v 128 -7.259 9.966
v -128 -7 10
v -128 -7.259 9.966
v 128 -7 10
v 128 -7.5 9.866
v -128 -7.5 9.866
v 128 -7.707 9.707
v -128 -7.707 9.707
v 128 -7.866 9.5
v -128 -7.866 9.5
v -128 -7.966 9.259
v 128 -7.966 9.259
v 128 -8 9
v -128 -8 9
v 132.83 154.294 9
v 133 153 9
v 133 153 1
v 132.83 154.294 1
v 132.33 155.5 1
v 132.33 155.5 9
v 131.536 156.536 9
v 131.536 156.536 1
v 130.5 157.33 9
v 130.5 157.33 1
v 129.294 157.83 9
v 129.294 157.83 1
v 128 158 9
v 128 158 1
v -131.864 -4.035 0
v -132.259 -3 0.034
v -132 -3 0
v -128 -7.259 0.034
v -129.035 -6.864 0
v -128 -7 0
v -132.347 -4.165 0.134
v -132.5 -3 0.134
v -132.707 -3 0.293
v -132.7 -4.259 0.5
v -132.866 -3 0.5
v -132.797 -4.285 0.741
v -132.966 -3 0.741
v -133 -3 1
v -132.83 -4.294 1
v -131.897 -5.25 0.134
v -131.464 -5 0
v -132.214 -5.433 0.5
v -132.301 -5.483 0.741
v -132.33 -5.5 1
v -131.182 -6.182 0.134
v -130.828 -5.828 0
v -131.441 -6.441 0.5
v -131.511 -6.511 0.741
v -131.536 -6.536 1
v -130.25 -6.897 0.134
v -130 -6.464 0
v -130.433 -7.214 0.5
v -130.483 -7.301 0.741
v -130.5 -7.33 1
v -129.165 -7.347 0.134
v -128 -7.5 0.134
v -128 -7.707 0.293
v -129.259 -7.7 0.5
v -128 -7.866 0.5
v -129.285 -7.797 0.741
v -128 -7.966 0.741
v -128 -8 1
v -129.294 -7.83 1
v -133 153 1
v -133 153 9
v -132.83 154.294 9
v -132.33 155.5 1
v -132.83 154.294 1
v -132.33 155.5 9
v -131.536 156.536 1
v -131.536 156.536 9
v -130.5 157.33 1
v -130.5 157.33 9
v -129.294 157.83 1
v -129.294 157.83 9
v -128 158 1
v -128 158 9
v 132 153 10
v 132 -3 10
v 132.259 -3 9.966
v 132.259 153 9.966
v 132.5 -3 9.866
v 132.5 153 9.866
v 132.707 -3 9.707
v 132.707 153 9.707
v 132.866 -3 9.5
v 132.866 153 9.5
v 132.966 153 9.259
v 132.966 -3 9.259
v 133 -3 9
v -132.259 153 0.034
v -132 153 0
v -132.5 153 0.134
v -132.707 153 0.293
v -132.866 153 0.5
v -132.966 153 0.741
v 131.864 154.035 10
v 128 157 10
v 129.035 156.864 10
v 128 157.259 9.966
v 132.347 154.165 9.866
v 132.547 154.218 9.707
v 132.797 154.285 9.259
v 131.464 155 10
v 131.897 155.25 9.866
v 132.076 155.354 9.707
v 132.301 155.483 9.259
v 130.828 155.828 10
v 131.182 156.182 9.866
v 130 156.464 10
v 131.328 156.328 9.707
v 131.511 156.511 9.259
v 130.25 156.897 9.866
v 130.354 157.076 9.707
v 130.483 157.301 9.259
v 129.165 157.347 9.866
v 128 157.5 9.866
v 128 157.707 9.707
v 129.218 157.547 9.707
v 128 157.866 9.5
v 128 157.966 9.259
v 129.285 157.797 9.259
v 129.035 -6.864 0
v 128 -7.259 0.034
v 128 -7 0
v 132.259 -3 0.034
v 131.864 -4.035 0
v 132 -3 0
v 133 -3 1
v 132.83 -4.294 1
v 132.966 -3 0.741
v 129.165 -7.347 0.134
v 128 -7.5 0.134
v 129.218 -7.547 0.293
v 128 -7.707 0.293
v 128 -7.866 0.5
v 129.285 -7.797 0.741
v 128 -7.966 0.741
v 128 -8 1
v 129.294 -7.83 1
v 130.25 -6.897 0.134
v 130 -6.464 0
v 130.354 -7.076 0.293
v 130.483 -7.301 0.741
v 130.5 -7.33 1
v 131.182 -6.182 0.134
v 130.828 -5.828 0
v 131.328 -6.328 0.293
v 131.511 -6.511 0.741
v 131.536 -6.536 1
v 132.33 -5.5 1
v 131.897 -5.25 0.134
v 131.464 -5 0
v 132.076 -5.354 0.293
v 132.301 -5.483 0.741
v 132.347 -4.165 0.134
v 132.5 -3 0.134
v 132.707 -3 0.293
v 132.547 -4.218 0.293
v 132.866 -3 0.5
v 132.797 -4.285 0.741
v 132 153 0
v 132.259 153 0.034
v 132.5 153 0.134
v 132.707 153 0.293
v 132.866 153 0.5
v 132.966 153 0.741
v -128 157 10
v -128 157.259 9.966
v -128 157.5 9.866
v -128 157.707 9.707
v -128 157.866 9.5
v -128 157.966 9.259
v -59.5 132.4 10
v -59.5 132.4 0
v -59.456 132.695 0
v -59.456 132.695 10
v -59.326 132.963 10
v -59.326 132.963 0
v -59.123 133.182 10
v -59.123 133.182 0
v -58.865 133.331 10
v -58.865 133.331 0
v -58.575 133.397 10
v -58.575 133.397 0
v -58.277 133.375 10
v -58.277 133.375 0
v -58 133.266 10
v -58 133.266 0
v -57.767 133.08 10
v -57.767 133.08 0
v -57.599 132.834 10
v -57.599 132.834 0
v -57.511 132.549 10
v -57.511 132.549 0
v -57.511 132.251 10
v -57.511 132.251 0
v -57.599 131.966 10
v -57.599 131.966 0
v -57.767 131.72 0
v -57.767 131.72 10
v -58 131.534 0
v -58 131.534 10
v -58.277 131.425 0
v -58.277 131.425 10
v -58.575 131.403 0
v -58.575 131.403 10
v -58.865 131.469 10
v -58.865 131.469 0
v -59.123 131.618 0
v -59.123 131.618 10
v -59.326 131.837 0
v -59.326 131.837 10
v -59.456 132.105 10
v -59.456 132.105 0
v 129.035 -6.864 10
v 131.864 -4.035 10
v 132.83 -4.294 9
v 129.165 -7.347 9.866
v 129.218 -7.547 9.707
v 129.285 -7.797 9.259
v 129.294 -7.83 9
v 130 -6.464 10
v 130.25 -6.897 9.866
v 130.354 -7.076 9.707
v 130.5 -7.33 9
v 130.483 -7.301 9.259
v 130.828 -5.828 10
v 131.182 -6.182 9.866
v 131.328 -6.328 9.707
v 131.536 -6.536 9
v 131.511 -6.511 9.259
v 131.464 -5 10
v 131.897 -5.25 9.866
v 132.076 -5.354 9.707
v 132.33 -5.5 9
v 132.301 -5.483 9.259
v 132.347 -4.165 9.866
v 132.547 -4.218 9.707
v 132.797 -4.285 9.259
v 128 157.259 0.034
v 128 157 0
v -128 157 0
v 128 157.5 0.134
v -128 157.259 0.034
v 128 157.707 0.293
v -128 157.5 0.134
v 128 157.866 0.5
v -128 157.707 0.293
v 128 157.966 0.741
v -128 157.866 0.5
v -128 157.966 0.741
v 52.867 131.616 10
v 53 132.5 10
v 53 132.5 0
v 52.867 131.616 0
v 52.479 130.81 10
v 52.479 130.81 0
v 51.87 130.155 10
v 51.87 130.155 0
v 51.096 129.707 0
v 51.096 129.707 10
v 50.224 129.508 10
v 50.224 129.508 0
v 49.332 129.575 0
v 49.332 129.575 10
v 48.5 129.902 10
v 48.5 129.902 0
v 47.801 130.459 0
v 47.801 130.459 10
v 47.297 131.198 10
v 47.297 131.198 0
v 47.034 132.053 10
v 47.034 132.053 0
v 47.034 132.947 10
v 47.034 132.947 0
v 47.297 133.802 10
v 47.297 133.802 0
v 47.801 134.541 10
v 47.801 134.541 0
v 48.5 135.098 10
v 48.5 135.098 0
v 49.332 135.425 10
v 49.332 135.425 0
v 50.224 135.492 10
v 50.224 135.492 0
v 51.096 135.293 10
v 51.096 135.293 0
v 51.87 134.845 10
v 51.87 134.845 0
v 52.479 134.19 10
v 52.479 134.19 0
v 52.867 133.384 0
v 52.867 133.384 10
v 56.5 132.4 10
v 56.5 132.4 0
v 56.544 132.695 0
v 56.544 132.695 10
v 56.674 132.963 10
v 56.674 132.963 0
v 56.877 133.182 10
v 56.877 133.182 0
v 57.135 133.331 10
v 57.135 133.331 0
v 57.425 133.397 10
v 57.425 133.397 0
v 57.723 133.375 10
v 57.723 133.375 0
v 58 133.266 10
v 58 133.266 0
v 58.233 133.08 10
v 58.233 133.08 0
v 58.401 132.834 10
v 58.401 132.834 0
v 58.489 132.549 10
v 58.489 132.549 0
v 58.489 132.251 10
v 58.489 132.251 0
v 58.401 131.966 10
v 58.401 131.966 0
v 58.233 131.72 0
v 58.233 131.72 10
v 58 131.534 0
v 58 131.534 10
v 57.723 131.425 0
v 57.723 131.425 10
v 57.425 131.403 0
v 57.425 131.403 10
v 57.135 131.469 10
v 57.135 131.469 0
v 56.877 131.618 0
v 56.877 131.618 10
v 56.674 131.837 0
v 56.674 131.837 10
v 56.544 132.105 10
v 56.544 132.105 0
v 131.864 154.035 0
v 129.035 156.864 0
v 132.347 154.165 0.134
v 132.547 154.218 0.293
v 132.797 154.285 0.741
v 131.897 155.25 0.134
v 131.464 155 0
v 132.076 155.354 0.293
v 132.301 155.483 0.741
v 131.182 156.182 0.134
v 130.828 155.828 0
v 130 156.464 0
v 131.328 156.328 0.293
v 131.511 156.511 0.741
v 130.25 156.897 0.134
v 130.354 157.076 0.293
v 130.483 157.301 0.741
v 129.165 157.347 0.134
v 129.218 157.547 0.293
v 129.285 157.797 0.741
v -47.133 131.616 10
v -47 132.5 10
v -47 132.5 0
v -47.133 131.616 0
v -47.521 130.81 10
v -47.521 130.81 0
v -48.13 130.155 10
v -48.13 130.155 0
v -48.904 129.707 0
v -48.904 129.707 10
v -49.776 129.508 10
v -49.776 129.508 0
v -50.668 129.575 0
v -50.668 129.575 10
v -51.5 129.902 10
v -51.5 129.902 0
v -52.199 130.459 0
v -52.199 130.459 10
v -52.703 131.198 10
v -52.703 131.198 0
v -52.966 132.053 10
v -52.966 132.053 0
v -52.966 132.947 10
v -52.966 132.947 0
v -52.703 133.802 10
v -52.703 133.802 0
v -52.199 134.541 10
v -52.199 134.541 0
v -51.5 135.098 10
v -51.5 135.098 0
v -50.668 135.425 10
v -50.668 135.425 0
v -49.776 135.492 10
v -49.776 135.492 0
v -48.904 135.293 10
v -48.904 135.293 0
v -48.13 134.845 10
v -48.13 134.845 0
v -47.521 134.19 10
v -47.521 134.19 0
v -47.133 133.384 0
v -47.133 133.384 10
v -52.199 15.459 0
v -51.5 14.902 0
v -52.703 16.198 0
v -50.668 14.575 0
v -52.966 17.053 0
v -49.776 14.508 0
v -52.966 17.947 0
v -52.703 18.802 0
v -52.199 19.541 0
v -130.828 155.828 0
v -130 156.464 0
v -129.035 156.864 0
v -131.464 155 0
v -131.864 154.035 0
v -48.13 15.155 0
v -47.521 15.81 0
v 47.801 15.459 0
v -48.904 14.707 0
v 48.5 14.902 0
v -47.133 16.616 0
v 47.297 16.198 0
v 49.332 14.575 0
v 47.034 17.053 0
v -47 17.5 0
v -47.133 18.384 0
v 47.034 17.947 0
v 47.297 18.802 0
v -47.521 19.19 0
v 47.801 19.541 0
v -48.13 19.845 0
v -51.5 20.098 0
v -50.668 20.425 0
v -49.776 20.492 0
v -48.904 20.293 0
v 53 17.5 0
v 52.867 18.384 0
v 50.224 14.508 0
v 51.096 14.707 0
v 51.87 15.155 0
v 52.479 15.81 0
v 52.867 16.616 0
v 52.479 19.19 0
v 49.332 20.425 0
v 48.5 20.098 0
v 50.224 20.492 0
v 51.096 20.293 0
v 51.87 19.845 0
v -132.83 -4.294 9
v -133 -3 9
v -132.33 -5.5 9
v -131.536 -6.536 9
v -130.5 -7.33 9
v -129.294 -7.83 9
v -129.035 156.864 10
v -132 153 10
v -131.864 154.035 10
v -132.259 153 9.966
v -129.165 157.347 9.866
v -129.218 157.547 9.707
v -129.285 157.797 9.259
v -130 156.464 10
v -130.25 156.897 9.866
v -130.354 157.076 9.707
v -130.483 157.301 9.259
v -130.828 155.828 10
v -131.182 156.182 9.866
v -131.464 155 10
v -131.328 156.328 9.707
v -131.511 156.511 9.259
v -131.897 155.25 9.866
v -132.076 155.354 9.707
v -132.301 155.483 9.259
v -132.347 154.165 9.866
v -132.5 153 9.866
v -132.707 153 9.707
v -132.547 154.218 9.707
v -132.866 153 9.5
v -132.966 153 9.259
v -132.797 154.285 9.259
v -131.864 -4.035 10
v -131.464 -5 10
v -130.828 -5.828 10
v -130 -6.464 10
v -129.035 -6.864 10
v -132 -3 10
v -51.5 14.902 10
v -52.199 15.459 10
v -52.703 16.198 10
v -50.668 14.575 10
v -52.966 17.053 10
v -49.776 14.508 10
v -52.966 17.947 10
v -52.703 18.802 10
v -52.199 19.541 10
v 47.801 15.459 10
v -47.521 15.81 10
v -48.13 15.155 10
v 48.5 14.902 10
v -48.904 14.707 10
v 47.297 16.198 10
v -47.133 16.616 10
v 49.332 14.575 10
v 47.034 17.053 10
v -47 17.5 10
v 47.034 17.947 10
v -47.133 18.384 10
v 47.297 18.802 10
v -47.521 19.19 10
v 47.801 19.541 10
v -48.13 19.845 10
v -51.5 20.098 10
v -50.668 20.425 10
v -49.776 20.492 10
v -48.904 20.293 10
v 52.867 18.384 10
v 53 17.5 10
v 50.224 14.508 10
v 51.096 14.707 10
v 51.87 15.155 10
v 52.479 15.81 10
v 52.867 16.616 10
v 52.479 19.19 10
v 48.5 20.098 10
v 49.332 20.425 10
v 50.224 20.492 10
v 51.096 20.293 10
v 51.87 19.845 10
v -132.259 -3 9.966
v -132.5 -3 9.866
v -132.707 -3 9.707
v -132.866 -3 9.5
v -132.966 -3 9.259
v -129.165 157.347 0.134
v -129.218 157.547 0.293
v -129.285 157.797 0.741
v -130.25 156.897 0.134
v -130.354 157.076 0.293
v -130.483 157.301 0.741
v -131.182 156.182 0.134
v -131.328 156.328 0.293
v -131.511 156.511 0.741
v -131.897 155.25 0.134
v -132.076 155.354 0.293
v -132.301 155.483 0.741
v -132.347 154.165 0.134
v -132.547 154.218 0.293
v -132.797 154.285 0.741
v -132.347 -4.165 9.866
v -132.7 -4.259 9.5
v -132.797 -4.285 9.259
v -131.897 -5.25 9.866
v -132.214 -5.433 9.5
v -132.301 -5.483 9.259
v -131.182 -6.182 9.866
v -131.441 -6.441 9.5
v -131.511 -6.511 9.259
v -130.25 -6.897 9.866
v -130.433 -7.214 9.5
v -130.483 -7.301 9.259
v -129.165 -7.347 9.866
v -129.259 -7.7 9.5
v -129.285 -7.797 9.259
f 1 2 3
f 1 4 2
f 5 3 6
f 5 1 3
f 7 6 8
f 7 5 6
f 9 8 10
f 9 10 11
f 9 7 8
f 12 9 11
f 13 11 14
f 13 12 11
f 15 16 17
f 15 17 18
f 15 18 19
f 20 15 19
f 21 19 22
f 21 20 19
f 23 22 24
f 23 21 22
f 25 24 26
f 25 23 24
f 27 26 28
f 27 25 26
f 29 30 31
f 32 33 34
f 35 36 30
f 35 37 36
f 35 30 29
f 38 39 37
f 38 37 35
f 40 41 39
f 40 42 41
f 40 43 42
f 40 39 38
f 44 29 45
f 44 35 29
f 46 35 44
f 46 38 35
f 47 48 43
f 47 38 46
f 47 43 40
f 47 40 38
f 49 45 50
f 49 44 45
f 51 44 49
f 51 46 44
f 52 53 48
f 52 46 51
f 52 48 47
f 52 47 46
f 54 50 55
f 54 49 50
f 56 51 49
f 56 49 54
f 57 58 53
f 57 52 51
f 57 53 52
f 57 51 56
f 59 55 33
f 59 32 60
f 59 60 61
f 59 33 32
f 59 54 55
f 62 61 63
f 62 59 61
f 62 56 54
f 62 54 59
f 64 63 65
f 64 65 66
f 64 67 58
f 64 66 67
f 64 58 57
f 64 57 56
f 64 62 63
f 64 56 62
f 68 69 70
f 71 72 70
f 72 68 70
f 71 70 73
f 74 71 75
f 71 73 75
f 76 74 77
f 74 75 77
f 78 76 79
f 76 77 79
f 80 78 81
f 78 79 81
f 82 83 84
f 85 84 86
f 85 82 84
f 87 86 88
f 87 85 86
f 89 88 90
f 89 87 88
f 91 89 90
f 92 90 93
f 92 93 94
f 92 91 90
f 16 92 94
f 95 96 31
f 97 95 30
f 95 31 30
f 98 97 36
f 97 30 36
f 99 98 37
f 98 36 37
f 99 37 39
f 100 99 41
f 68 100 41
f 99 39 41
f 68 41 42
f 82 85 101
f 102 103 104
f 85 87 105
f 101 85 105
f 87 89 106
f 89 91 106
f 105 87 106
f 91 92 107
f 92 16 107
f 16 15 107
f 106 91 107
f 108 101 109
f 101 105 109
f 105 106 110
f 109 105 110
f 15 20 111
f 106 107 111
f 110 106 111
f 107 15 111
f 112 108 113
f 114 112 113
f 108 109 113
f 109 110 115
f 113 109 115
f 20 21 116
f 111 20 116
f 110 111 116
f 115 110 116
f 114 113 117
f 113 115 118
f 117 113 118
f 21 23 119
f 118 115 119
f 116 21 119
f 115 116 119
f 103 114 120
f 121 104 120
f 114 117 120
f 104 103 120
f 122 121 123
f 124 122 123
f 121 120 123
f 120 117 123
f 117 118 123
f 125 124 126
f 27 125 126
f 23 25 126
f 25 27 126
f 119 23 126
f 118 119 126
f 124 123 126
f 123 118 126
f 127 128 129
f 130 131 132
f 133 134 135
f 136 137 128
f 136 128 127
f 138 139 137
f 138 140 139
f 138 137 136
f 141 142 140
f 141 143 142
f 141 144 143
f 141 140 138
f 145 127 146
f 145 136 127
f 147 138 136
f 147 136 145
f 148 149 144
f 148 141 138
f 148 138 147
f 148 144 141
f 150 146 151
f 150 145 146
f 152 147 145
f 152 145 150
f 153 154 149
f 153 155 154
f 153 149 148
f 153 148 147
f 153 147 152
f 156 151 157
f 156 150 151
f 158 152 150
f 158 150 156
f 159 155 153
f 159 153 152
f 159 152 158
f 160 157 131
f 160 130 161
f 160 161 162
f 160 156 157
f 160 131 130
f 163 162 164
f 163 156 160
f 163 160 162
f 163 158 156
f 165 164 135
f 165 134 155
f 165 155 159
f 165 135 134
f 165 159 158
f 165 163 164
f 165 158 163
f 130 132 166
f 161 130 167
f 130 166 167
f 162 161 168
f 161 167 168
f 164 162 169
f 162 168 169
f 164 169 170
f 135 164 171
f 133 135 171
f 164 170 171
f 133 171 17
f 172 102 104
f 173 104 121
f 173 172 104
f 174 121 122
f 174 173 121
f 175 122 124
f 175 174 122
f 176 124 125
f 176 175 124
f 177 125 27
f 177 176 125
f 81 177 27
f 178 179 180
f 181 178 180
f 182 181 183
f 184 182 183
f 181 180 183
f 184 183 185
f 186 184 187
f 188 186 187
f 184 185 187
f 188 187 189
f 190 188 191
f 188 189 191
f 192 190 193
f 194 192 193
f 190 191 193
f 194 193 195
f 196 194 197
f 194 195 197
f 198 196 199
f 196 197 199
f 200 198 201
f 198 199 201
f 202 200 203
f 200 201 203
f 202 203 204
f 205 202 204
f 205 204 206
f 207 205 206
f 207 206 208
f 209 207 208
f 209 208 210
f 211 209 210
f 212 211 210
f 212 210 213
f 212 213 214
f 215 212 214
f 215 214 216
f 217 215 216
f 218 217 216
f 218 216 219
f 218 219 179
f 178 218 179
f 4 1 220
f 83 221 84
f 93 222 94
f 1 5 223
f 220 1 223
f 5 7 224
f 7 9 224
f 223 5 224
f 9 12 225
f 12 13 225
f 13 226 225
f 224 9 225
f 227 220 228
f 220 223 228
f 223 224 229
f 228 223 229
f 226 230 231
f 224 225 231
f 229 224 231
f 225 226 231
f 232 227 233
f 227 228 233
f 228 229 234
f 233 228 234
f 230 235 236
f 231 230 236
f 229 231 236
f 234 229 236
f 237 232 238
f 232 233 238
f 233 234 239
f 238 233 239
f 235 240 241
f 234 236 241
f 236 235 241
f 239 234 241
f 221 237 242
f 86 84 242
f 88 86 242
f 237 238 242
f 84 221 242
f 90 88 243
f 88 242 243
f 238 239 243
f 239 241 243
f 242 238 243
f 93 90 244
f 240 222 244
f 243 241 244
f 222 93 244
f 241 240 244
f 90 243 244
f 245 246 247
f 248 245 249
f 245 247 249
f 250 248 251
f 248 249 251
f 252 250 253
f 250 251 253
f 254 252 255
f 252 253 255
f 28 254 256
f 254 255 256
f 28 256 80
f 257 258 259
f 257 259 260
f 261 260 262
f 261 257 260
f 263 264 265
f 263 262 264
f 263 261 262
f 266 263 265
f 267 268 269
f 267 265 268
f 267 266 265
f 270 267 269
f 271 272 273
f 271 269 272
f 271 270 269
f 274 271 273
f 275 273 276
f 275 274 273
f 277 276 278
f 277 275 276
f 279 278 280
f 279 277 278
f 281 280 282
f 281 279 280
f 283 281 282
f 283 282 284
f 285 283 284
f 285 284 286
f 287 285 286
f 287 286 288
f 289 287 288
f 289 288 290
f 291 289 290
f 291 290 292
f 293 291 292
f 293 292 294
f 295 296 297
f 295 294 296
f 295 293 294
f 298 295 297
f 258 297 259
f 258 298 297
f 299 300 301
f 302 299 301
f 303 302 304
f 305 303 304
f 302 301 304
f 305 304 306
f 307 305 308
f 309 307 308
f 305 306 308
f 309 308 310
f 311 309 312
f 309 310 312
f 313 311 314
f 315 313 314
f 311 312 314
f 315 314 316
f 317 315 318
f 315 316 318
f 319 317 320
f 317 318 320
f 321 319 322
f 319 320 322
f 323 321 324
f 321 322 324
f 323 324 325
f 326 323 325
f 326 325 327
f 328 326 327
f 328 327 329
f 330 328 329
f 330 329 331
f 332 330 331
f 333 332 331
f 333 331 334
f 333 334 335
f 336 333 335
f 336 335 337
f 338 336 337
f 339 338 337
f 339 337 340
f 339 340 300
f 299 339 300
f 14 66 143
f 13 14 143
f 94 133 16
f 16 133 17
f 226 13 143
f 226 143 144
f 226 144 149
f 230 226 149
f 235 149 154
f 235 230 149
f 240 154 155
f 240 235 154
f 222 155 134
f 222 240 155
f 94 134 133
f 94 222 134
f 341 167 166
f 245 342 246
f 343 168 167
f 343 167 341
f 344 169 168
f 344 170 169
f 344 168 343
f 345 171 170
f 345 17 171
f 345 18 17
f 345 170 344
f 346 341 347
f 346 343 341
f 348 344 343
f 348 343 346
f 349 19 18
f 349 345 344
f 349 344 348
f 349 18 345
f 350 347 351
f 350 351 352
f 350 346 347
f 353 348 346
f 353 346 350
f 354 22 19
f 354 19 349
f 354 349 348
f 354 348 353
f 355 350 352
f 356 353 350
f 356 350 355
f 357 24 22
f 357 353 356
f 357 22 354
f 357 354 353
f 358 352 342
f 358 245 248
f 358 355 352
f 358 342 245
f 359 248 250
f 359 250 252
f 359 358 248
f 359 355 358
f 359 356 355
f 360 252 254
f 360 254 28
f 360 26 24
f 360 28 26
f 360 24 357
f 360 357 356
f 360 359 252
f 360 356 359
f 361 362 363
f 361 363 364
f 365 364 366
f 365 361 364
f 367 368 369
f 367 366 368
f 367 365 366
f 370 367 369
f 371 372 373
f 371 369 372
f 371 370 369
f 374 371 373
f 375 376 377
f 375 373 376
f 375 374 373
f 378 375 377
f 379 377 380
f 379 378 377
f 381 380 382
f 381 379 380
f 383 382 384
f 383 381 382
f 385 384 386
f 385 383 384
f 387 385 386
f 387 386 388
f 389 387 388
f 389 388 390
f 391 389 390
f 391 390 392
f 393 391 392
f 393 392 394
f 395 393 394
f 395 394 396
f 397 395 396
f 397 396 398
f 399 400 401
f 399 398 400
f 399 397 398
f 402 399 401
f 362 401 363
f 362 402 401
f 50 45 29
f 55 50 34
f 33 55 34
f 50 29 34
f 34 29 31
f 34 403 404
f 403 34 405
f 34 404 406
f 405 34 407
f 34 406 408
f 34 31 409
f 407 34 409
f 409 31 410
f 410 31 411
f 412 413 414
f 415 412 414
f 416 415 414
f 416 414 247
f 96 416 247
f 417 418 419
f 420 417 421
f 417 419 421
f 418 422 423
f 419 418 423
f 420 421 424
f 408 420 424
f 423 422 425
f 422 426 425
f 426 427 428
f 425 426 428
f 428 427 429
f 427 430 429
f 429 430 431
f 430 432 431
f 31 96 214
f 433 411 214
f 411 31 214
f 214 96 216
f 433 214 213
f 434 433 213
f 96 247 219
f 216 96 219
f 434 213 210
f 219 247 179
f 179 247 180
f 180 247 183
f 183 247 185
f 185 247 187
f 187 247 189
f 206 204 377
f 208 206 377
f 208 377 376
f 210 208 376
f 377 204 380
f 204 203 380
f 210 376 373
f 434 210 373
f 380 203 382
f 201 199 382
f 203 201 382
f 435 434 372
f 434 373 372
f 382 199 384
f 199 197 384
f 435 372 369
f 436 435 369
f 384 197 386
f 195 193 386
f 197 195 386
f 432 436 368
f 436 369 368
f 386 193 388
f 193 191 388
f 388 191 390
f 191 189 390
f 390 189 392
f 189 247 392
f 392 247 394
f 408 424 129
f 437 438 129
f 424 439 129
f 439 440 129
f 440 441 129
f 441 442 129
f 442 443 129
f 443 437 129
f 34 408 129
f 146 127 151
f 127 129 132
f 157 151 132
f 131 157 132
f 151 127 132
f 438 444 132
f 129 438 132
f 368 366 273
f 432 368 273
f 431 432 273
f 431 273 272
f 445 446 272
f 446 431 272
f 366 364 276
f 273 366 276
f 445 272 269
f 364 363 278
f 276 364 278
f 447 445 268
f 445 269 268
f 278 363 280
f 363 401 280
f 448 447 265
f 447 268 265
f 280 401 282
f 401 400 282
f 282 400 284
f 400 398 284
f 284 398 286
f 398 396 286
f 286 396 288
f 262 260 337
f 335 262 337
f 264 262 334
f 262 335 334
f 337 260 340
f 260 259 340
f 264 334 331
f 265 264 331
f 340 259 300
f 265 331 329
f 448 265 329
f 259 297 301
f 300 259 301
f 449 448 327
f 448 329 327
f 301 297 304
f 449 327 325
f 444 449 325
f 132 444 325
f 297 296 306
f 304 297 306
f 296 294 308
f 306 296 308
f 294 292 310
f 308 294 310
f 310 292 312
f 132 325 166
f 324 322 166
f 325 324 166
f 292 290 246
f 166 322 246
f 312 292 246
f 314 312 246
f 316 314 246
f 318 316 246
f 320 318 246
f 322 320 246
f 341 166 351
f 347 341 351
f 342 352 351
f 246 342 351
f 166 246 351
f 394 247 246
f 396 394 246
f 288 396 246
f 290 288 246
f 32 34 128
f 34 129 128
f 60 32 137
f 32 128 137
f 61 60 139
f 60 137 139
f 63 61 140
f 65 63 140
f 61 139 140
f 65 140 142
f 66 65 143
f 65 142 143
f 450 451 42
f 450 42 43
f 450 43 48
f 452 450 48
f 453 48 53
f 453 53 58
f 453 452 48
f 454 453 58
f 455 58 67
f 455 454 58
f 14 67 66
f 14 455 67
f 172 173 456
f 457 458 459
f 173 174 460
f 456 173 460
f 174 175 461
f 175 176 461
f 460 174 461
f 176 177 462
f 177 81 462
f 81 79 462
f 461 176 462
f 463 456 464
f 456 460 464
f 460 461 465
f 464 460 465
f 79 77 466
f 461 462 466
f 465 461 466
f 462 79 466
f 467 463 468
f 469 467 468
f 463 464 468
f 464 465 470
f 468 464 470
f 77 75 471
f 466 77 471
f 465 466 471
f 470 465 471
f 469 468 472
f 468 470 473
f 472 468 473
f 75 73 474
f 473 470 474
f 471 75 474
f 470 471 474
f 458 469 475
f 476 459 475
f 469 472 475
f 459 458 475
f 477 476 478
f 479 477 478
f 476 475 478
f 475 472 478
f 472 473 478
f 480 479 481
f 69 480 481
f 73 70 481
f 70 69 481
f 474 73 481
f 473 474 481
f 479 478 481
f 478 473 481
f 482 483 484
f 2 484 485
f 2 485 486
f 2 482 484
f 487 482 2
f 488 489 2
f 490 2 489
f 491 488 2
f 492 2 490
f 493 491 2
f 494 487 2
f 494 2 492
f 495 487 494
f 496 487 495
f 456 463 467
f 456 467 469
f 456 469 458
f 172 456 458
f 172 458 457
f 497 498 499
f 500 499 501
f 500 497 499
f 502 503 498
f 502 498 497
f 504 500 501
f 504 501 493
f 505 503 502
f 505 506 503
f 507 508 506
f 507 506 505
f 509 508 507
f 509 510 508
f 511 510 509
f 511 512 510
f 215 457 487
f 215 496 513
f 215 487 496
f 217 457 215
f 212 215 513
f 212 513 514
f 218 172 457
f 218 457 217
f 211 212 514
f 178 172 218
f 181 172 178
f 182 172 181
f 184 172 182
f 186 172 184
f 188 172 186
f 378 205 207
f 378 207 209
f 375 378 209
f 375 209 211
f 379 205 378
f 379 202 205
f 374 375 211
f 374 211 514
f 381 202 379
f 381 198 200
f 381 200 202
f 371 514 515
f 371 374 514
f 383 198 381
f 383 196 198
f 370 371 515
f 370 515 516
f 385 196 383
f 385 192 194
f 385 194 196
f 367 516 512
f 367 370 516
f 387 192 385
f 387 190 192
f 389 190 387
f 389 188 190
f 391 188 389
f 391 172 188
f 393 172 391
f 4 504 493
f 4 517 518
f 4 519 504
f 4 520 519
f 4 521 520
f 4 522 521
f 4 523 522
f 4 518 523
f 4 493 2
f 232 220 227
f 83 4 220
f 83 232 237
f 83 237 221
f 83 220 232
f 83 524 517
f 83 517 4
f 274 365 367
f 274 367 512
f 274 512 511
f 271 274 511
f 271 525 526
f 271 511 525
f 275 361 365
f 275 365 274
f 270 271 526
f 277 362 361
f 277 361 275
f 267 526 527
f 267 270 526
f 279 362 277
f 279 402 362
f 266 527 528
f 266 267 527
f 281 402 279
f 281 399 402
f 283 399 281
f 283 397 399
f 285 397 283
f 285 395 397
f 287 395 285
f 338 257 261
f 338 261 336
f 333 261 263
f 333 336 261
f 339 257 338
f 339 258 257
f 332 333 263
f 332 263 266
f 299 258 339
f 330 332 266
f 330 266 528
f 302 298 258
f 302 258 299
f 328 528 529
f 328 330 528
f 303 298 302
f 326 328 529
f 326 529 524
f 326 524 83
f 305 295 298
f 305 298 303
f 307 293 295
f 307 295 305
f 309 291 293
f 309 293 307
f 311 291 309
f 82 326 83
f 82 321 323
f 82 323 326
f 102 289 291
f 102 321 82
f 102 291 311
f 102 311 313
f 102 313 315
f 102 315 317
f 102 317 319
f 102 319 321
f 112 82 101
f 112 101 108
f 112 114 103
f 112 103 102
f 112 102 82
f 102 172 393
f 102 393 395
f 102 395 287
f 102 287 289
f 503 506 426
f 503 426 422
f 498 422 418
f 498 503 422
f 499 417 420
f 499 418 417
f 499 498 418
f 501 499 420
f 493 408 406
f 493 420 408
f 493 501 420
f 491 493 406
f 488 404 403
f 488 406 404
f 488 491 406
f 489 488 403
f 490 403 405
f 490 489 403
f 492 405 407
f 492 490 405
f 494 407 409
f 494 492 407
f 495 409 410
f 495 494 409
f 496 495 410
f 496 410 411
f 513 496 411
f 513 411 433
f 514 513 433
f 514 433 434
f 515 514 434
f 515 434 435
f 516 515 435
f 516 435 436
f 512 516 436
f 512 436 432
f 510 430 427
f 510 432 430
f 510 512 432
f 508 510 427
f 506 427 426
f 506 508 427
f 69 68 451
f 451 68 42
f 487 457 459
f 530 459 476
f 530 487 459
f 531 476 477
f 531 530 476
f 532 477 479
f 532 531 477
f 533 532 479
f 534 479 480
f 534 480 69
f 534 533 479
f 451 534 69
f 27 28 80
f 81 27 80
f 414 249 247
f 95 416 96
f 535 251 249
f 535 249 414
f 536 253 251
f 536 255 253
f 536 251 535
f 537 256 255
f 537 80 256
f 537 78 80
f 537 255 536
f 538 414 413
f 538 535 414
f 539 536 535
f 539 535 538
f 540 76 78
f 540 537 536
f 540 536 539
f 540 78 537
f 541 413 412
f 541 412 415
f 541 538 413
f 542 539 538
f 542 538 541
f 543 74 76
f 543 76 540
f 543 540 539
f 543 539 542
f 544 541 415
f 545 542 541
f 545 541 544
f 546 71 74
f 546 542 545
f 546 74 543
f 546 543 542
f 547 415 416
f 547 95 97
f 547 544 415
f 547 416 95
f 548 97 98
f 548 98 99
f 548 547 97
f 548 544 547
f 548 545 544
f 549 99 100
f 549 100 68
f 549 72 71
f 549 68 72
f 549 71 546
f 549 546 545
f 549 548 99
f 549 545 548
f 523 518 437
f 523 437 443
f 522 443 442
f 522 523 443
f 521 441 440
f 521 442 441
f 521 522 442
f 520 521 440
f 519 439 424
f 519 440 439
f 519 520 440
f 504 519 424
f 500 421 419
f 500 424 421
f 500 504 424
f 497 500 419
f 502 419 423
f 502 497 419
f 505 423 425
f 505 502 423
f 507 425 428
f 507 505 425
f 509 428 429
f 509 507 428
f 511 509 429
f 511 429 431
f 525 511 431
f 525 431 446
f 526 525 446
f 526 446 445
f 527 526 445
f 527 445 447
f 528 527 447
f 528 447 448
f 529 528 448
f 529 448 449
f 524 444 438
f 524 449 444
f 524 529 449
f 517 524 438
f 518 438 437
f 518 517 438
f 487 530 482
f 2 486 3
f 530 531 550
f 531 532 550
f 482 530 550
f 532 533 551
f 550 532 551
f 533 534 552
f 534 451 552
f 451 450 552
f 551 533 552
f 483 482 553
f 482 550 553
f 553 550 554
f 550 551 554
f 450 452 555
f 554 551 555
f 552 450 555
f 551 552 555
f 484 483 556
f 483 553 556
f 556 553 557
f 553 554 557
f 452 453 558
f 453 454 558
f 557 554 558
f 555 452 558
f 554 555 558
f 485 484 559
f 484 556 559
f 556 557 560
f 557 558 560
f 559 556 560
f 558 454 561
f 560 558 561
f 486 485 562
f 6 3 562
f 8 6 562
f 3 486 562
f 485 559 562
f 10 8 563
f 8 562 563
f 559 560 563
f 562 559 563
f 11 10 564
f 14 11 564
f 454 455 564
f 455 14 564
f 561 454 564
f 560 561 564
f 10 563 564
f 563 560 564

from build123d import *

# Parameters (mm, degrees)
BOSS_EXTRUDE1_DEPTH     = 10
FILLET1_R               = 5
CUT_EXTRUDE1_DEPTH      = 207.767985917
CUT_EXTRUDE1_DEPTH_BACK = 207.767985917
SKETCH2_R               = 3
FILLET2_R               = 1
SKETCH4_R               = 1
CUT_EXTRUDE2_DEPTH      = 207.767985981


with BuildPart() as part:
    # Sketch1 → Boss-Extrude1 (new body)
    with BuildSketch(Plane.XY):
        Polygon((125, 158), (-125, 158), (-133, 158), (-133, 150), (-133, 0), (-133, -8), (-125, -8), (125, -8), (133, -8), (133, 0), (133, 150), (133, 158), align=None)
    extrude(amount=BOSS_EXTRUDE1_DEPTH)

    # Fillet1
    fillet1_edges = [part.edges().sort_by_distance(p)[0] for p in [
        (-133, -8, 5),
        (133, -8, 5),
        (133, 158, 5),
        (-133, 158, 5),
    ]]
    fillet(fillet1_edges, radius=FILLET1_R)

    # Sketch2 → Cut-Extrude1 (cut, two sides: drawn at the far end of the back side and taken through both)
    with BuildSketch(Plane(origin=(0, 0, 0), x_dir=(-1, 0, 0), z_dir=(0, 0, -1)).offset(-CUT_EXTRUDE1_DEPTH_BACK)):
        with Locations(Location((-50, 132.5, 0), (0, 0, 180))):
            Circle(SKETCH2_R)
        with Locations(Location((50, 132.5, 0), (0, 0, 180))):
            Circle(SKETCH2_R)
        with Locations(Location((-50, 17.5, 0), (0, 0, 180))):
            Circle(SKETCH2_R)
        with Locations(Location((50, 17.5, 0), (0, 0, 180))):
            Circle(SKETCH2_R)
    extrude(amount=CUT_EXTRUDE1_DEPTH + CUT_EXTRUDE1_DEPTH_BACK, mode=Mode.SUBTRACT)

    # Fillet2
    fillet2_edges = [part.edges().sort_by_distance(p)[0] for p in [
        (0, -8, 10),
        (0, -8, 0),
        (131.535533906, -6.535533906, 10),
        (-131.535533906, -6.535533906, 10),
        (133, 75, 10),
        (-133, 75, 10),
        (131.535533906, 156.535533906, 10),
        (-131.535533906, 156.535533906, 10),
        (0, 158, 10),
        (131.535533906, -6.535533906, 0),
        (-131.535533906, -6.535533906, 0),
        (-133, 75, 0),
        (133, 75, 0),
        (-131.535533906, 156.535533906, 0),
        (131.535533906, 156.535533906, 0),
        (0, 158, 0),
    ]]
    fillet(fillet2_edges, radius=FILLET2_R)

    # Sketch4 → Cut-Extrude2 (cut, through all)
    with BuildSketch(Plane(origin=(0, 0, 0), x_dir=(-1, 0, 0), z_dir=(0, 0, -1))):
        with Locations((58.5, 132.4)):
            Circle(SKETCH4_R)
        with Locations((-57.5, 132.4)):
            Circle(SKETCH4_R)
    extrude(amount=-CUT_EXTRUDE2_DEPTH, mode=Mode.SUBTRACT)


solid = part.part
